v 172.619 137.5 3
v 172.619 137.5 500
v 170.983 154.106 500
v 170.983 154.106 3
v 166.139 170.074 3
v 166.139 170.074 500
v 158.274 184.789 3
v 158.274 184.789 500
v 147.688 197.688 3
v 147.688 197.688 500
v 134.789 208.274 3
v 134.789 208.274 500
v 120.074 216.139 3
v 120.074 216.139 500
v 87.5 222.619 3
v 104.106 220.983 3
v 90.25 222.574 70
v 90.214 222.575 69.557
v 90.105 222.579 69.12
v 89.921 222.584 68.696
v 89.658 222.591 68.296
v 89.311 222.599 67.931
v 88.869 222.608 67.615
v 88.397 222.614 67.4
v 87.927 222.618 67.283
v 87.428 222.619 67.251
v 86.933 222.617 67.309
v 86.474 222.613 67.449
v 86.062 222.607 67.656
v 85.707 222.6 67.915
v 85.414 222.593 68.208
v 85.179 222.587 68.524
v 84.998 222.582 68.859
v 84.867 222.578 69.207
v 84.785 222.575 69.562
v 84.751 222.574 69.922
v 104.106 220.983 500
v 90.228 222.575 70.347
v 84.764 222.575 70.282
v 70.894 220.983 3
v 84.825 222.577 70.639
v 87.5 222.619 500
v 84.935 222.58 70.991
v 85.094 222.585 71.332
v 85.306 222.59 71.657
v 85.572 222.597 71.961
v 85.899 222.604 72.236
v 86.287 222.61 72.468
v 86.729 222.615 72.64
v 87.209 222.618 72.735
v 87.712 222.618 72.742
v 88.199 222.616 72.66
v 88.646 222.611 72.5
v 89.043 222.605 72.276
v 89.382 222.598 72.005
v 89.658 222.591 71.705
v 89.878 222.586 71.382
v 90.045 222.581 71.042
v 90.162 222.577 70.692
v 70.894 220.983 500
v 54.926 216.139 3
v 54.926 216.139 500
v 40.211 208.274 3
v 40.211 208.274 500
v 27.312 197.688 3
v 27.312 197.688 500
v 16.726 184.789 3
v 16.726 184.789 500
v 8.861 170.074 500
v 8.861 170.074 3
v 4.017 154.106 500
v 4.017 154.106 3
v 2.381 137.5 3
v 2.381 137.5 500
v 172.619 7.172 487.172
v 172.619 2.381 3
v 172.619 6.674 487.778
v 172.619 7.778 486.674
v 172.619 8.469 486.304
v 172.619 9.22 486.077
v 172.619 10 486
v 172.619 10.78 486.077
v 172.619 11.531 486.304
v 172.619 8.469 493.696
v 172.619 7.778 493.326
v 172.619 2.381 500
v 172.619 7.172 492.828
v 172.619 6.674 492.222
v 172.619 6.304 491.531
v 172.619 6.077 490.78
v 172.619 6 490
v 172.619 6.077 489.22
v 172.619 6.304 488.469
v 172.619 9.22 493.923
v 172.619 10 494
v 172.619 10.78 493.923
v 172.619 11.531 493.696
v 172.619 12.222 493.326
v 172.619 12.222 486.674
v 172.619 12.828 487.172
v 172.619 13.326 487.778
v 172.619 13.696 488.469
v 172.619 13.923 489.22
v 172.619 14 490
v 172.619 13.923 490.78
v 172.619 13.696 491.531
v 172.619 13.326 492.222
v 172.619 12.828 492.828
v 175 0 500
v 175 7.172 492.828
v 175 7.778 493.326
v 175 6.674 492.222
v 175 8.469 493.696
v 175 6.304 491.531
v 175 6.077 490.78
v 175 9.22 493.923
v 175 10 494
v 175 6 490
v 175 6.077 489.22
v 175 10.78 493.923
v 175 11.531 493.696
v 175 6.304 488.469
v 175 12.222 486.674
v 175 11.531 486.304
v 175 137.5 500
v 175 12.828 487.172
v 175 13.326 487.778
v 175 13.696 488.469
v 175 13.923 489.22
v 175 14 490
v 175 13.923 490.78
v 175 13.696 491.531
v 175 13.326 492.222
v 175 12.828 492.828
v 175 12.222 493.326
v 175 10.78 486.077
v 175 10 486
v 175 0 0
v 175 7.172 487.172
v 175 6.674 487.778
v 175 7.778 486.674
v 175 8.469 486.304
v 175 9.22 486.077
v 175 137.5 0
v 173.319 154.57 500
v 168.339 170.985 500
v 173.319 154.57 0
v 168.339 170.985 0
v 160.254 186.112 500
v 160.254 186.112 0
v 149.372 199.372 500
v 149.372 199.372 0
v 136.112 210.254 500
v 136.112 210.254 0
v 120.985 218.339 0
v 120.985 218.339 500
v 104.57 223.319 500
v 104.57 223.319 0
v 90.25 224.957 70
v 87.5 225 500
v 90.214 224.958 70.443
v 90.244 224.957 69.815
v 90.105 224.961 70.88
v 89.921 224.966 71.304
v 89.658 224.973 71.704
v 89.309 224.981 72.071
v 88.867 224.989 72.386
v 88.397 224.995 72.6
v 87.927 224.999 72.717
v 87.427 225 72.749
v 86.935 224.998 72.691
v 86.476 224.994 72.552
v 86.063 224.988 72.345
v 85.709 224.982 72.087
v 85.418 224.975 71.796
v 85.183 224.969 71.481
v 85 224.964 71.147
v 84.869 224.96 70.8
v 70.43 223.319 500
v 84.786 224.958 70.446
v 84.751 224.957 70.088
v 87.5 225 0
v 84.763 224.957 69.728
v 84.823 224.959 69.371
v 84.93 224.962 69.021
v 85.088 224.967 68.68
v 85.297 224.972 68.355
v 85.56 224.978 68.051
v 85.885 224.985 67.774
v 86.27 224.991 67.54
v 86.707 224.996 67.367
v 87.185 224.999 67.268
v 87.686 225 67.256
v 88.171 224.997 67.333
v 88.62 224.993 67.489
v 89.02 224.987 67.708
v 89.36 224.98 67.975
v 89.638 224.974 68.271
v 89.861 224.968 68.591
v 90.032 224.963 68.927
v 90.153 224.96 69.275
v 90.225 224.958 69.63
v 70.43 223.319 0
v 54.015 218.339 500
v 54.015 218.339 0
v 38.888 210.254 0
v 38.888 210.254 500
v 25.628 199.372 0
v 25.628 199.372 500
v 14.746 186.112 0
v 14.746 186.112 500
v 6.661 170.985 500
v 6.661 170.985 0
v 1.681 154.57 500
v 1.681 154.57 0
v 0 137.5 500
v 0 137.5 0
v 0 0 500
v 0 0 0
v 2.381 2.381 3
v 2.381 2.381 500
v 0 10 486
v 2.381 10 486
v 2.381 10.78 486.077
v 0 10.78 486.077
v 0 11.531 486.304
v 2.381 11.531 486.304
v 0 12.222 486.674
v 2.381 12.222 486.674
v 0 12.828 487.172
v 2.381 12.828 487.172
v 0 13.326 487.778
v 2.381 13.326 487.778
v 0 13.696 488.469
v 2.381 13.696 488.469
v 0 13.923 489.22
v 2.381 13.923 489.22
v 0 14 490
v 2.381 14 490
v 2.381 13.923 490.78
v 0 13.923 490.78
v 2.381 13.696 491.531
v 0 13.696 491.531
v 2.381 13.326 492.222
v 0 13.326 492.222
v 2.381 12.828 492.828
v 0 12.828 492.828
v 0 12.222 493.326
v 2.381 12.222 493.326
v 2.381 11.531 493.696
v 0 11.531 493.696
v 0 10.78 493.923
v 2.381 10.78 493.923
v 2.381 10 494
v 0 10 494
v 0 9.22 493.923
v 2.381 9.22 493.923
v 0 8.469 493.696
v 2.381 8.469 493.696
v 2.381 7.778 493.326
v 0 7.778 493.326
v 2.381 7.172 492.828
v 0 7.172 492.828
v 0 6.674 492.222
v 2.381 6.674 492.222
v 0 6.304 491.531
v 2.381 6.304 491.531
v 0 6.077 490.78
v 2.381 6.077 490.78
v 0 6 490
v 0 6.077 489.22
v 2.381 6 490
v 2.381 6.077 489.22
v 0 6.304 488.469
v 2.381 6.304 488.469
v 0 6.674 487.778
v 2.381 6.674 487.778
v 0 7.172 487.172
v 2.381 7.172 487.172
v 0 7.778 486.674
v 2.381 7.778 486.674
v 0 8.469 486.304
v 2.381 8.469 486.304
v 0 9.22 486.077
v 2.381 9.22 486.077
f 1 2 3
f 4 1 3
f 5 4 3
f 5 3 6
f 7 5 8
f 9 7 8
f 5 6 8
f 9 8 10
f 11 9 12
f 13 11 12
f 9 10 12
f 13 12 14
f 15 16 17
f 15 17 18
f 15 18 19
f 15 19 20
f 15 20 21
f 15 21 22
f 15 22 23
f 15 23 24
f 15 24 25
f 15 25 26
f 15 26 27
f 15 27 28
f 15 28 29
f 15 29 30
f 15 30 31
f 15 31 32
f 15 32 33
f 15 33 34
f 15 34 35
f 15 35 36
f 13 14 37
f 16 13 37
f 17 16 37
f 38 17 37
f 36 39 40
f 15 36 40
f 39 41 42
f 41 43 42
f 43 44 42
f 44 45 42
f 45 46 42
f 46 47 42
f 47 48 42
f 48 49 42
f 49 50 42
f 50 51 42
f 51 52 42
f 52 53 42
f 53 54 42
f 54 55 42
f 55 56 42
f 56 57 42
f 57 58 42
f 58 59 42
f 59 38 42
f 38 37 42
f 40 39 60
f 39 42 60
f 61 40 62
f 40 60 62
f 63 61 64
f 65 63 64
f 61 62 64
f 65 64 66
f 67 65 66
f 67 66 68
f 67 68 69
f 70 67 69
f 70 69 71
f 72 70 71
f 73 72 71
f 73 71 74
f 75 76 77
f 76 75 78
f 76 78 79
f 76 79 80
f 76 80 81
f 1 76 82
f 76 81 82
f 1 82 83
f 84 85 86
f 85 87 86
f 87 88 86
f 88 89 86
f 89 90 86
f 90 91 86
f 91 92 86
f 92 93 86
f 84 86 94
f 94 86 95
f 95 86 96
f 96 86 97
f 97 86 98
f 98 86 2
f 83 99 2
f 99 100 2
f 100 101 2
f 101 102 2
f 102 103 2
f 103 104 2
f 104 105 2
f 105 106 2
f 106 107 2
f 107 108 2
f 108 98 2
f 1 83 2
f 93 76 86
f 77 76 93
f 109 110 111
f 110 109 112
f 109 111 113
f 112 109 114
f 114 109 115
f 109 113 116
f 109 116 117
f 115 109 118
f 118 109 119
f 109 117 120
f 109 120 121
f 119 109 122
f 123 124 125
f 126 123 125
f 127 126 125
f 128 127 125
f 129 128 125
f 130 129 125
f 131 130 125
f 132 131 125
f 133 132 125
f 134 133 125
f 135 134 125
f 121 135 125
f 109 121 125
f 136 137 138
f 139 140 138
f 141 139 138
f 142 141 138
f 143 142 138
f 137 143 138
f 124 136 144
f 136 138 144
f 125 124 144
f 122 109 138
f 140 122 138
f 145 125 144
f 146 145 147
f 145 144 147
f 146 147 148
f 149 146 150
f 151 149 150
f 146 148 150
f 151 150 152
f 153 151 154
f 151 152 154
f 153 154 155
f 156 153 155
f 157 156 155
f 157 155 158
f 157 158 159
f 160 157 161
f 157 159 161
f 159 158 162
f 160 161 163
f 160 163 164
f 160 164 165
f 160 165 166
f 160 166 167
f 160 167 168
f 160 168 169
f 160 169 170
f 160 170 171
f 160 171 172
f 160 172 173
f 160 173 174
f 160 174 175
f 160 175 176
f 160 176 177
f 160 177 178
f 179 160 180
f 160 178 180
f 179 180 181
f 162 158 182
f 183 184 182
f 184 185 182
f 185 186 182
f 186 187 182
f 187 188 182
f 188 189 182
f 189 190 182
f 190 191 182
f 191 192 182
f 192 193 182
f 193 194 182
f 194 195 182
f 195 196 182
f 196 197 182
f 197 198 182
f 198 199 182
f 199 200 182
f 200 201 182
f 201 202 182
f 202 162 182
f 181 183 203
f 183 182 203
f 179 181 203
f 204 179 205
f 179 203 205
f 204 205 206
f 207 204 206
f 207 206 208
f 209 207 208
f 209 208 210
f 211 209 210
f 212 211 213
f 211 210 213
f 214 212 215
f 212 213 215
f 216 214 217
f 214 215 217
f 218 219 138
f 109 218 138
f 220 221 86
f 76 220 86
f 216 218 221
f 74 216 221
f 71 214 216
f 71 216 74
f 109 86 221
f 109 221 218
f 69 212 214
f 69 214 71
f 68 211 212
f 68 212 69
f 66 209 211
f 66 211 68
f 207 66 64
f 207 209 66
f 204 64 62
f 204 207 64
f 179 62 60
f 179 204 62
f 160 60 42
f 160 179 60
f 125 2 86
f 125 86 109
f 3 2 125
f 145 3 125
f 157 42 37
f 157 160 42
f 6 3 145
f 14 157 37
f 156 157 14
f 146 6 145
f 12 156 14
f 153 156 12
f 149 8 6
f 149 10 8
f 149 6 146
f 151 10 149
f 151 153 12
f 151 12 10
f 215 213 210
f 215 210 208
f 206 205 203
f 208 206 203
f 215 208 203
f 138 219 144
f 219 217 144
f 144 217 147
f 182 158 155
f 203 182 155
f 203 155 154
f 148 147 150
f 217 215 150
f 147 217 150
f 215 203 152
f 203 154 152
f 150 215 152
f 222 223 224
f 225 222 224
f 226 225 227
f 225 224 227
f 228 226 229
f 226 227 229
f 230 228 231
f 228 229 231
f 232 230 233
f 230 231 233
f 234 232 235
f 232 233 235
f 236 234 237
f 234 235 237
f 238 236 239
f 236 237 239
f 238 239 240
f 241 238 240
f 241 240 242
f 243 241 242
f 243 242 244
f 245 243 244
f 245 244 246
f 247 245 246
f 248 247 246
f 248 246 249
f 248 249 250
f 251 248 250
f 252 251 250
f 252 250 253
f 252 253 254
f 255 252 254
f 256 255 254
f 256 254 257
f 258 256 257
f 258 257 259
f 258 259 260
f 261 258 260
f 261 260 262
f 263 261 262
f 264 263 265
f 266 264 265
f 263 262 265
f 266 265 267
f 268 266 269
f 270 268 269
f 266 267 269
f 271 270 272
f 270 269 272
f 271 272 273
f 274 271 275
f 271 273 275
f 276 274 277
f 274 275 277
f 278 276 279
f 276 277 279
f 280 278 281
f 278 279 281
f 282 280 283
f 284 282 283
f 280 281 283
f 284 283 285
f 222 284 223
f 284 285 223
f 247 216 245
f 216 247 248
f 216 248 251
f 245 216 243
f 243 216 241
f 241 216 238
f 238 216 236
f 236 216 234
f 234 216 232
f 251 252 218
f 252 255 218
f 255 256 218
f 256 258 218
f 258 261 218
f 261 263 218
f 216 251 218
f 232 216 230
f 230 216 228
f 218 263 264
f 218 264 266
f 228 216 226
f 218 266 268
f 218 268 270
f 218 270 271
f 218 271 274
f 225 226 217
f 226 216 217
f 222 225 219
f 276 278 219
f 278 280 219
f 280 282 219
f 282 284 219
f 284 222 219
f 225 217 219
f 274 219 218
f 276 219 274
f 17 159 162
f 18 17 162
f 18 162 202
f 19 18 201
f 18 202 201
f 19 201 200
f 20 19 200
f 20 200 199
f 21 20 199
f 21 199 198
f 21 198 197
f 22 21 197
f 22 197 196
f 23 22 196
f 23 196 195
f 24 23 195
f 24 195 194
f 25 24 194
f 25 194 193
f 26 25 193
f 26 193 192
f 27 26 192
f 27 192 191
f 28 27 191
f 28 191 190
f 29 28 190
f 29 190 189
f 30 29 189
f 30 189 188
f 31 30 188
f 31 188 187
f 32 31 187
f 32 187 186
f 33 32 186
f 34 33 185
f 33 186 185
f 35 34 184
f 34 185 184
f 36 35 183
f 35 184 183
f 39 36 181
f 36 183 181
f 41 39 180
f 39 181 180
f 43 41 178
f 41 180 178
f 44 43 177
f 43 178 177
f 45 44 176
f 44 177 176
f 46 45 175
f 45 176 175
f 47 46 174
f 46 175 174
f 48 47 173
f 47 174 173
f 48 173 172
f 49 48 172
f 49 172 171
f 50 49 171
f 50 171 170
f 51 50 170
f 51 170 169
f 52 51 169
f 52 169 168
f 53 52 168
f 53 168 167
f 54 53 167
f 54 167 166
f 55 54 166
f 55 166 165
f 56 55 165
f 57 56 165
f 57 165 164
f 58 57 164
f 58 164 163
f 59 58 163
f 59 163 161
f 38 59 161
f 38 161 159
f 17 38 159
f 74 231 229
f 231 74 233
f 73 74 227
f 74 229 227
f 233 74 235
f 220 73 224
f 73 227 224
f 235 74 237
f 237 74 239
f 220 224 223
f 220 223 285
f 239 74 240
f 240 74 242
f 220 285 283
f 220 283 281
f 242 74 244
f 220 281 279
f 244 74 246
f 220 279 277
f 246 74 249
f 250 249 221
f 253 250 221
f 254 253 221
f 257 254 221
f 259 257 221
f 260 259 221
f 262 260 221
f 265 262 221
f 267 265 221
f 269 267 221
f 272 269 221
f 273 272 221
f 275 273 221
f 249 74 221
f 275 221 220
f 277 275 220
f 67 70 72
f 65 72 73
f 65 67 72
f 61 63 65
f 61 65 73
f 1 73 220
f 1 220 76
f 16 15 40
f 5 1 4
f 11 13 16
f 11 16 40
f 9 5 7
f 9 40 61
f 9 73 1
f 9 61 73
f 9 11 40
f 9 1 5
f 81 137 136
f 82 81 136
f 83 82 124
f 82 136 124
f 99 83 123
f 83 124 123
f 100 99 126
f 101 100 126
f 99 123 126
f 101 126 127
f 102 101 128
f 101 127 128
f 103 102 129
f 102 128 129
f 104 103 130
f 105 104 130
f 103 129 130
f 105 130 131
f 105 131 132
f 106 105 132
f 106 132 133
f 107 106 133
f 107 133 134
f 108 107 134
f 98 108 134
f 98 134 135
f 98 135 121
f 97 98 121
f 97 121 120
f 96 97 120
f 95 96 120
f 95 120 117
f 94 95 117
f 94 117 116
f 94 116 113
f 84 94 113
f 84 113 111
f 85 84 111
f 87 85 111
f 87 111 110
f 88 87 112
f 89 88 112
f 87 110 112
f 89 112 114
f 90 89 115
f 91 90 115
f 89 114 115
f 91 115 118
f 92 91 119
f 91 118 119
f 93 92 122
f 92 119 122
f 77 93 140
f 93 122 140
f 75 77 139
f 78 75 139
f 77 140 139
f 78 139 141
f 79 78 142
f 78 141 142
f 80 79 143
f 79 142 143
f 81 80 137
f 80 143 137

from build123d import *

# Parameters (mm, degrees)
BOSS_EXTRUDE1_DEPTH = 500
CUT_EXTRUDE1_DEPTH  = 497
SKETCH3_R           = 4
CUT_EXTRUDE2_DEPTH  = 497
SKETCH4_R           = 2.75
CUT_EXTRUDE3_DEPTH  = 5


with BuildPart() as part:
    # Sketch1 → Boss-Extrude1 (new body)
    with BuildSketch(Plane.XY):
        with BuildLine():
            Line((0, 0), (175, 0))
            Line((175, 0), (175, 137.5))
            ThreePointArc((175, 137.5), (87.5, 225), (0, 137.5))
            Line((0, 137.5), (0, 0))
        make_face()
    extrude(amount=BOSS_EXTRUDE1_DEPTH)

    # Sketch2 → Cut-Extrude1 (cut)
    with BuildSketch(Plane.XY.offset(500)):
        with BuildLine():
            Line((172.61875, 2.38125), (172.61875, 137.5))
            ThreePointArc((172.61875, 137.5), (87.5, 222.61875), (2.38125, 137.5))
            Line((2.38125, 137.5), (2.38125, 2.38125))
            Line((2.38125, 2.38125), (172.61875, 2.38125))
        make_face()
    extrude(amount=-CUT_EXTRUDE1_DEPTH, mode=Mode.SUBTRACT)

    # Sketch3 → Cut-Extrude2 (cut)
    with BuildSketch(Plane(origin=(175, 0, 0), x_dir=(0, 0, -1), z_dir=(1, 0, 0))):
        with Locations((-490, 10)):
            Circle(SKETCH3_R)
    extrude(amount=-CUT_EXTRUDE2_DEPTH, mode=Mode.SUBTRACT)

    # Sketch4 → Cut-Extrude3 (cut)
    with BuildSketch(Plane(origin=(0, 225, 0), x_dir=(1, 0, 0), z_dir=(0, 1, 0))):
        with Locations((87.5, -70)):
            Circle(SKETCH4_R)
    extrude(amount=-CUT_EXTRUDE3_DEPTH, mode=Mode.SUBTRACT)


solid = part.part
